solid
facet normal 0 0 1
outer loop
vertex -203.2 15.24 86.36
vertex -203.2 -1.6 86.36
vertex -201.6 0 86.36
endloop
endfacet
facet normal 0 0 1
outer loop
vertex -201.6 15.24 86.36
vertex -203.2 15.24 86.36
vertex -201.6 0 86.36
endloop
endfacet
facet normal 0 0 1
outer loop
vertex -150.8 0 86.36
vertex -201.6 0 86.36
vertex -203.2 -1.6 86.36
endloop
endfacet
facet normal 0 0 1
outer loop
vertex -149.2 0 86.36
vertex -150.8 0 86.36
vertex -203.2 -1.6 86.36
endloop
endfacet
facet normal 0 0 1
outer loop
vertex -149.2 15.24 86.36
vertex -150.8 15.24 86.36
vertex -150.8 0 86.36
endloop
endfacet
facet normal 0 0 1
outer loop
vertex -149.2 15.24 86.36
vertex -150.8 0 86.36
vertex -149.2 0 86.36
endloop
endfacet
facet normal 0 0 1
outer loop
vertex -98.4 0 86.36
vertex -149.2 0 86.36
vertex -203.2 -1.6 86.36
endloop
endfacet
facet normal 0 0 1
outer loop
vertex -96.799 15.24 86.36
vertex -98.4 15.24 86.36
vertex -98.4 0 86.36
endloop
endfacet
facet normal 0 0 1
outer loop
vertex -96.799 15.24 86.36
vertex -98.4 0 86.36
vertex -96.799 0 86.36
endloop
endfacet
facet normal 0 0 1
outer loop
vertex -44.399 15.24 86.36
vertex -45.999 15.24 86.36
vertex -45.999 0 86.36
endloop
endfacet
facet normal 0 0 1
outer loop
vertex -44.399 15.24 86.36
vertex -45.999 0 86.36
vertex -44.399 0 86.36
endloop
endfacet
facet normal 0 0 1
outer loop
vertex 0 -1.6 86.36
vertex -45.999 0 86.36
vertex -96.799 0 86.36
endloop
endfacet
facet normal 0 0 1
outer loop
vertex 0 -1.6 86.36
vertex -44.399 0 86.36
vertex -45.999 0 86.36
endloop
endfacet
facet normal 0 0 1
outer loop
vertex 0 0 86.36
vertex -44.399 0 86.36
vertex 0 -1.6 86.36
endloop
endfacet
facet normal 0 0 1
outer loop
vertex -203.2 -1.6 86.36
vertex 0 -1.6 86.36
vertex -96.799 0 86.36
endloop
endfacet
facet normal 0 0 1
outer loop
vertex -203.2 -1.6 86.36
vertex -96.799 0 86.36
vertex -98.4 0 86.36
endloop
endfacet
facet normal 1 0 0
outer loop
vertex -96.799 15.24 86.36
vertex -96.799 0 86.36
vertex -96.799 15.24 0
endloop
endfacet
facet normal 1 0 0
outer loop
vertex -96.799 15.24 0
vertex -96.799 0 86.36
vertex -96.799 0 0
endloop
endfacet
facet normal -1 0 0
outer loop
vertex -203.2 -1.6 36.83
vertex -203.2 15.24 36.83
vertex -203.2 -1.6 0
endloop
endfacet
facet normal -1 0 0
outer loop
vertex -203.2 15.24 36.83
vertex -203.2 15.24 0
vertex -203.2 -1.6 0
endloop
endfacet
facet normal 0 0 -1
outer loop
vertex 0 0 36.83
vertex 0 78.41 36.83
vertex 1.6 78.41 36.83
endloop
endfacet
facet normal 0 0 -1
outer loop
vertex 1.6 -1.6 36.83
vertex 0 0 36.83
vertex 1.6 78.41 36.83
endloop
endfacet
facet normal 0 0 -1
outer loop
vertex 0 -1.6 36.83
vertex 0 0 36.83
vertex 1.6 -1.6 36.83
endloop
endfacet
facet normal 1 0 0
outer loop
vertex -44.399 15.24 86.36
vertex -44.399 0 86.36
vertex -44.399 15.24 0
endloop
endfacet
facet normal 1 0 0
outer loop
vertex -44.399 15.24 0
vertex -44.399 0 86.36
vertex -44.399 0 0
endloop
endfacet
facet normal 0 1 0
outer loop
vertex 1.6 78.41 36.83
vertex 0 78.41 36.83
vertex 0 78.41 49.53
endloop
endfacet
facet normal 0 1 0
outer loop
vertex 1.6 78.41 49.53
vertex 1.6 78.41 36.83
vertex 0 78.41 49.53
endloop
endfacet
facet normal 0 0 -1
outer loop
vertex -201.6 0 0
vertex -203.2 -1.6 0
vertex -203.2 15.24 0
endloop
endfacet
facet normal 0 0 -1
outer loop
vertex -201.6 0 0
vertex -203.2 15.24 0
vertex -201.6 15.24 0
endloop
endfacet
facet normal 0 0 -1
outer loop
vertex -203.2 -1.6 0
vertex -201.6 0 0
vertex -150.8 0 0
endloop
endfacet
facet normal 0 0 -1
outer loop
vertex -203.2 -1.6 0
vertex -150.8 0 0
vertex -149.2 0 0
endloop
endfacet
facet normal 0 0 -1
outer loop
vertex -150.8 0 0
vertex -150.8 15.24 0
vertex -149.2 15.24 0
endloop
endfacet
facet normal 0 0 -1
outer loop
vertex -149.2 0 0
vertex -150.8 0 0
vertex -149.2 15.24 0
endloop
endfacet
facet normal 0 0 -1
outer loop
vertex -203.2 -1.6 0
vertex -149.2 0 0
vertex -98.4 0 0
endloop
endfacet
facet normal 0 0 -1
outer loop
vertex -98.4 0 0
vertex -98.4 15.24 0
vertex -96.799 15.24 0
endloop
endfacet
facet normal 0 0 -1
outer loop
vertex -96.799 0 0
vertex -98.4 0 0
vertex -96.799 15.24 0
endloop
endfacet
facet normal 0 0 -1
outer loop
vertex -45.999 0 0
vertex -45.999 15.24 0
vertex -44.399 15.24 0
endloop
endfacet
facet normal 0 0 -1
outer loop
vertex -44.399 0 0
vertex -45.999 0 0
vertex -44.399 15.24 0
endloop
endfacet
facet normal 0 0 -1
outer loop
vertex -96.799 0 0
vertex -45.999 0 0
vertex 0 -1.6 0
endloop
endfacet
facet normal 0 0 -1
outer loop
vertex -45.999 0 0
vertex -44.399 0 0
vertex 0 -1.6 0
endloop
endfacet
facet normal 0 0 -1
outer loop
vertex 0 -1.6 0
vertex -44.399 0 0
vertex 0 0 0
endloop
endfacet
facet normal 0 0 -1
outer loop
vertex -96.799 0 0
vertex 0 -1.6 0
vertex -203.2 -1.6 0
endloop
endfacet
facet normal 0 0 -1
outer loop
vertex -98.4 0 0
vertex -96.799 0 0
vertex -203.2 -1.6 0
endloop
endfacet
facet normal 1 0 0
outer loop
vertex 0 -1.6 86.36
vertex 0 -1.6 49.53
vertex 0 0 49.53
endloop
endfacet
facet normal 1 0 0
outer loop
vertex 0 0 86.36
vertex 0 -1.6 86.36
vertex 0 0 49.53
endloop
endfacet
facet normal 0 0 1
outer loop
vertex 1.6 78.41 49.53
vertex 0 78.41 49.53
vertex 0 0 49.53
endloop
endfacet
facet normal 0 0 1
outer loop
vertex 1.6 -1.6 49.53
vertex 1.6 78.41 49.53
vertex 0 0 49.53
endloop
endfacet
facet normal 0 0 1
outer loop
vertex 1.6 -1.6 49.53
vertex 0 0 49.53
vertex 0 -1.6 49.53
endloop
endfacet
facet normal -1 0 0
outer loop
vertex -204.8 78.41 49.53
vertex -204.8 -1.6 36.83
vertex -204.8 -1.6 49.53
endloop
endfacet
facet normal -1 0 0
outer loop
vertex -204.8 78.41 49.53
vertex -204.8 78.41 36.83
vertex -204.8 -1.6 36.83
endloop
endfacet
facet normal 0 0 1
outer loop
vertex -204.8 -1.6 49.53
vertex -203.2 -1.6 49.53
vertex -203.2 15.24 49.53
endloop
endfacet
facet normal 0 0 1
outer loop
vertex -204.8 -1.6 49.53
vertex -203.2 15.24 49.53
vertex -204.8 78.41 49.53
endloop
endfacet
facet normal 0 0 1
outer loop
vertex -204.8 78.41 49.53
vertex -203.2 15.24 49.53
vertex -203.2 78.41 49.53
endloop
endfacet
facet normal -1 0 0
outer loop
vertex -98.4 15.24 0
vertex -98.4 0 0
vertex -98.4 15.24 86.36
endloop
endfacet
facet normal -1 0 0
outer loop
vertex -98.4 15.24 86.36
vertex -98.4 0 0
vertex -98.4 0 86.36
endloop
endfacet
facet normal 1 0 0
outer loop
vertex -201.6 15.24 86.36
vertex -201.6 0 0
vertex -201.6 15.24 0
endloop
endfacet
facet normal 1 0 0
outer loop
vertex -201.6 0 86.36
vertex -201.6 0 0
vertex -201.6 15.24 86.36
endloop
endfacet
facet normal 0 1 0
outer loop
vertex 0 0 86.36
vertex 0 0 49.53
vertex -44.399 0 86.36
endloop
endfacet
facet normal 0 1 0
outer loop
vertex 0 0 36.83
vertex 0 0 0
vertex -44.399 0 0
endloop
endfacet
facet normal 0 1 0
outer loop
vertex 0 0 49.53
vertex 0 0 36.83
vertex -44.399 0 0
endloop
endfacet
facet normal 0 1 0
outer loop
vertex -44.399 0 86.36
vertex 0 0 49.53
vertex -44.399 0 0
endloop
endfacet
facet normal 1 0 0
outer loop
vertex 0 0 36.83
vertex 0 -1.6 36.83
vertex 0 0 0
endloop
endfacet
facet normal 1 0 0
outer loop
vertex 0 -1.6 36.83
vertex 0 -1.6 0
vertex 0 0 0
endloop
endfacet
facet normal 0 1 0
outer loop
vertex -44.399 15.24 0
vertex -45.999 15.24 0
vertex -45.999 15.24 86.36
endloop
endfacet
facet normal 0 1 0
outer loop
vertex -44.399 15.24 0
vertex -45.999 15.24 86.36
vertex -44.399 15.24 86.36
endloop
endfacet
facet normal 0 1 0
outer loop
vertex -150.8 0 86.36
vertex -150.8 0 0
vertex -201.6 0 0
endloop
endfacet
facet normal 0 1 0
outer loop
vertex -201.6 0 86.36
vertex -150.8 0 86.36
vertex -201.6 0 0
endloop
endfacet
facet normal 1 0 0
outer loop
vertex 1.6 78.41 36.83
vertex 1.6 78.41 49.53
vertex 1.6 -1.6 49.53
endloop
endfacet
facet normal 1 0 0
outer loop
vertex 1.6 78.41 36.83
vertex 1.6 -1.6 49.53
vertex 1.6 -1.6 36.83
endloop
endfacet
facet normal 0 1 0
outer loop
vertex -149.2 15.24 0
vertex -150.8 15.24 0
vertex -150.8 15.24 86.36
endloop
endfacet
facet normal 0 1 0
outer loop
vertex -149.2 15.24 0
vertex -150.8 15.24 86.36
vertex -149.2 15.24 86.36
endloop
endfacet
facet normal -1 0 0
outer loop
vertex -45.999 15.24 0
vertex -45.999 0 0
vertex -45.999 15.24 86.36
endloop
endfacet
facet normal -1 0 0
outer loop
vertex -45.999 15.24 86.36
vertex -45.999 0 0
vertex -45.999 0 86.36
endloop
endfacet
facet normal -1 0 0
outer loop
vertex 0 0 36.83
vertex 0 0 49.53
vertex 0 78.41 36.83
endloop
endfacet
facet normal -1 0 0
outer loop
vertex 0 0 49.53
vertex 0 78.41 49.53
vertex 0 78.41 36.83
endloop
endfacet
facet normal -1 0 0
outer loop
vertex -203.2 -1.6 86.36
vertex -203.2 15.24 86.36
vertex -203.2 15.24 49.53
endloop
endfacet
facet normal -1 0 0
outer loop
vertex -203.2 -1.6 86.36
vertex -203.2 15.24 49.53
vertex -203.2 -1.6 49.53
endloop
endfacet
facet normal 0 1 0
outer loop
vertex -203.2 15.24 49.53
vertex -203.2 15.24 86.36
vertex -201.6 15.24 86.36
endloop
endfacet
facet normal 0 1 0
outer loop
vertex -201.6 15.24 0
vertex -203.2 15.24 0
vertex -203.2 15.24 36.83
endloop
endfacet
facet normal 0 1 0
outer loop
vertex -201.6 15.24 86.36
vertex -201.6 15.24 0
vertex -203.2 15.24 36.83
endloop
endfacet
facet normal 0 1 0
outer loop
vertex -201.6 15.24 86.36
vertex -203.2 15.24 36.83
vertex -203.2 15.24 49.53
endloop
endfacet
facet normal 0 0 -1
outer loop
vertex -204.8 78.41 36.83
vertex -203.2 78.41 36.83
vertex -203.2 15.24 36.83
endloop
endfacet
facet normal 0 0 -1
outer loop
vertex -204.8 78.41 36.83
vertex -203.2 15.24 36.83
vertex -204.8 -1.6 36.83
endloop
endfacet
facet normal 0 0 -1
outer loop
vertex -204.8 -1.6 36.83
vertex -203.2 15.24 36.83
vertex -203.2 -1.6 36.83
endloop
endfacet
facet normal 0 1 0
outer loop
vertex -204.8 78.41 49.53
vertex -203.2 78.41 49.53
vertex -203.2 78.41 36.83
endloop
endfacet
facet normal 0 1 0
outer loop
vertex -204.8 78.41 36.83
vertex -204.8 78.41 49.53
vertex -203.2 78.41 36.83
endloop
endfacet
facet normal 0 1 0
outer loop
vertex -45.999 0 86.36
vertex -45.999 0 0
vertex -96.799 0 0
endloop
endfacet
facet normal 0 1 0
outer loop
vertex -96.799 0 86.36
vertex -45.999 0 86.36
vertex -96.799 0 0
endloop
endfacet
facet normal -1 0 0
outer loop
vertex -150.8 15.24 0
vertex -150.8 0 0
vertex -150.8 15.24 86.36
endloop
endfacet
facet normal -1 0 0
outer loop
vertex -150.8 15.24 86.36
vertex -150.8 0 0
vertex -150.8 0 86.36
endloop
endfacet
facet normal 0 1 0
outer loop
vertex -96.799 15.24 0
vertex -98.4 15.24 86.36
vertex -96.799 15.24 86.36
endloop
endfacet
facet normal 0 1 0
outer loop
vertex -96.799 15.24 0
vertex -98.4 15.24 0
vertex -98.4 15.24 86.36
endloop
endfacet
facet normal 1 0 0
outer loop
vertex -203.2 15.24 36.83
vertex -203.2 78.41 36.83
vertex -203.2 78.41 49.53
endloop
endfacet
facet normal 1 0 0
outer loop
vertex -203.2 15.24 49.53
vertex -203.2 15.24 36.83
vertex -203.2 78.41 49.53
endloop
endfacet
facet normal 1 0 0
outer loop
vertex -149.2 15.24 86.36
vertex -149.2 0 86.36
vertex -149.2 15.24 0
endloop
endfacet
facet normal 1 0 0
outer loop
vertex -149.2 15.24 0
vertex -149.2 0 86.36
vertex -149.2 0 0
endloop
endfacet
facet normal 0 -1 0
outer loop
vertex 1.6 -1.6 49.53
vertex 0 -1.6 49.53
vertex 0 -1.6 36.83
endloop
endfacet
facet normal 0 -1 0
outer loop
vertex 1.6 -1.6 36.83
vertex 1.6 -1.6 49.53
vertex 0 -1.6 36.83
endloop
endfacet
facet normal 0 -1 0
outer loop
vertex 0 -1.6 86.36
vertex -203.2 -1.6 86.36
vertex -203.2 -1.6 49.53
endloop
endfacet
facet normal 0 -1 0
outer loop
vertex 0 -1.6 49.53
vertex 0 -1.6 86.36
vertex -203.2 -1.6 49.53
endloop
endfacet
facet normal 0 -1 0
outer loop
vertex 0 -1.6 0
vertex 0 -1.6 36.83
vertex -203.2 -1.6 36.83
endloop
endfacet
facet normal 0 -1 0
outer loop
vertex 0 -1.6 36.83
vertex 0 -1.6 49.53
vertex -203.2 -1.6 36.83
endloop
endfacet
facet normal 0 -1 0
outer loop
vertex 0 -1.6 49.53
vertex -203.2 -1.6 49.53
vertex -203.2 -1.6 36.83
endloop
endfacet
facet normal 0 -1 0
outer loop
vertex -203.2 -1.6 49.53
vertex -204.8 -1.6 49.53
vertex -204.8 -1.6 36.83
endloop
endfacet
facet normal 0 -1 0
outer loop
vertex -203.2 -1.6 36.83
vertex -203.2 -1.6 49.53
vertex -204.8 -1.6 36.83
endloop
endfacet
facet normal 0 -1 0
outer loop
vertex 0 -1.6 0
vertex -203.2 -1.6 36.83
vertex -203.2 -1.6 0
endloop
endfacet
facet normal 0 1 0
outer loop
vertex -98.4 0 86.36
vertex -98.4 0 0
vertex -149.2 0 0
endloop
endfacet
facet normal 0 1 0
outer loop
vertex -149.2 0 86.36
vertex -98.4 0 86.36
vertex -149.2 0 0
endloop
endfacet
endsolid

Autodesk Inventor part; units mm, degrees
ref_plane "YZ Plane" through (0, 0, 0) normal (1, 0, 0) x (0, 1, 0)
ref_plane "XZ Plane" through (0, 0, 0) normal (0, 1, 0) x (-1, 0, 0)
ref_plane "XY Plane" through (0, 0, 0) normal (0, 0, 1) x (1, 0, 0)
sketch "Sketch1" plane through (0, 0, 0) normal (0, 0, 1) x (1, 0, 0)
  line L0 (0, 0) -> (-203.2, 0)
  line L1 (-203.2, 0) -> (-203.2, -1.6002)
  line L2 (-203.2, -1.6002) -> (0, -1.6002)
  line L3 (0, -1.6002) -> (0, 0)
  dimension "d0" = 203.2
  dimension "d1" = 1.6002
extrude "Extrusion1" add sketch "Sketch1" along normal blind 86.36
sketch "Sketch2" plane through (-203.2, 0, 0) normal (0, 1, 0) x (1, 0, 0)
  line L0 (203.2, 0) -> (0, 0) projected
  line L1 (203.2, -86.36) -> (0, -86.36) projected
  line L2 (0, 0) -> (1.6002, 0)
  line L3 (1.6002, 0) -> (1.6002, -86.36)
  line L4 (1.6002, -86.36) -> (0, -86.36)
  line L5 (0, -86.36) -> (0, 0)
  dimension "d4" = 1.6002
extrude "Extrusion2" add sketch "Sketch2" along normal blind 15.24
sketch "Sketch3" plane through (0, 0, 86.36) normal (0, 1, 0) x (1, 0, 0)
  line L0 (-203.2, 0) -> (0, 0) projected
  line L1 (-203.2, 86.36) -> (0, 86.36) projected
  line L2 (-150.7998, 0) -> (-149.1996, 0)
  line L3 (-149.1996, 0) -> (-149.1996, 86.36)
  line L4 (-149.1996, 86.36) -> (-150.7998, 86.36)
  line L5 (-150.7998, 86.36) -> (-150.7998, 0)
  dimension "d7" = 1.6002
extrude "Extrusion3" add sketch "Sketch3" along normal blind 15.24
sketch "Sketch4" plane through (0, 0, 86.36) normal (0, 1, 0) x (1, 0, 0)
  line L0 (-203.2, 0) -> (0, 0) projected
  line L1 (-203.2, 86.36) -> (0, 86.36) projected
  line L2 (-98.3996, 0) -> (-96.7994, 0)
  line L3 (-96.7994, 0) -> (-96.7994, 86.36)
  line L4 (-96.7994, 86.36) -> (-98.3996, 86.36)
  line L5 (-98.3996, 86.36) -> (-98.3996, 0)
  dimension "d10" = 1.6002
extrude "Extrusion4" add sketch "Sketch4" along normal blind 15.24
sketch "Sketch5" plane through (0, 0, 86.36) normal (0, 1, 0) x (1, 0, 0)
  line L0 (0, 0) -> (-96.7994, 0) projected
  line L1 (0, 86.36) -> (-96.7994, 86.36) projected
  line L2 (-45.9994, 0) -> (-44.3992, 0)
  line L3 (-44.3992, 0) -> (-44.3992, 86.36)
  line L4 (-44.3992, 86.36) -> (-45.9994, 86.36)
  line L5 (-45.9994, 86.36) -> (-45.9994, 0)
  dimension "d13" = 1.6002
extrude "Extrusion5" add sketch "Sketch5" along normal blind 15.24
sketch "Sketch6" plane through (-203.2, -1.6002, 0) normal (-1, 0, 0) x (0, 0, 1)
  line L0 (0, 0) -> (86.36, 0) projected
  line L1 (36.83, 0) -> (49.53, 0)
  line L2 (49.53, 0) -> (49.53, 80.01)
  line L3 (49.53, 80.01) -> (36.83, 80.01)
  line L4 (36.83, 80.01) -> (36.83, 0)
  point P0 (0, 1.6002)
  dimension "d16" = 12.7
  dimension "d17" = 80.01
extrude "Extrusion6" add sketch "Sketch6" along normal blind 1.6002
sketch "Sketch7" plane through (0, 0, 86.36) normal (1, 0, 0) x (0, 0, -1)
  line L0 (36.83, -1.6002) -> (0, -1.6002) projected
  line L1 (49.53, 78.4098) -> (49.53, -1.6002) projected
  line L2 (36.83, -1.6002) -> (49.53, -1.6002)
  line L3 (49.53, -1.6002) -> (49.53, 78.4098)
  line L4 (49.53, 78.4098) -> (36.83, 78.4098)
  line L5 (36.83, 78.4098) -> (36.83, -1.6002)
  point P0 (86.36, 0)
  dimension "d20" = 80.01
extrude "Extrusion7" add sketch "Sketch7" along normal blind 1.6002
sketch "Sketch8" plane through (-96.7994, 0, 86.36) normal (0, 1, 0) x (1, 0, 0)
  point P0 (96.7994, 86.36)
properties part number "ModulePlate2.0"
